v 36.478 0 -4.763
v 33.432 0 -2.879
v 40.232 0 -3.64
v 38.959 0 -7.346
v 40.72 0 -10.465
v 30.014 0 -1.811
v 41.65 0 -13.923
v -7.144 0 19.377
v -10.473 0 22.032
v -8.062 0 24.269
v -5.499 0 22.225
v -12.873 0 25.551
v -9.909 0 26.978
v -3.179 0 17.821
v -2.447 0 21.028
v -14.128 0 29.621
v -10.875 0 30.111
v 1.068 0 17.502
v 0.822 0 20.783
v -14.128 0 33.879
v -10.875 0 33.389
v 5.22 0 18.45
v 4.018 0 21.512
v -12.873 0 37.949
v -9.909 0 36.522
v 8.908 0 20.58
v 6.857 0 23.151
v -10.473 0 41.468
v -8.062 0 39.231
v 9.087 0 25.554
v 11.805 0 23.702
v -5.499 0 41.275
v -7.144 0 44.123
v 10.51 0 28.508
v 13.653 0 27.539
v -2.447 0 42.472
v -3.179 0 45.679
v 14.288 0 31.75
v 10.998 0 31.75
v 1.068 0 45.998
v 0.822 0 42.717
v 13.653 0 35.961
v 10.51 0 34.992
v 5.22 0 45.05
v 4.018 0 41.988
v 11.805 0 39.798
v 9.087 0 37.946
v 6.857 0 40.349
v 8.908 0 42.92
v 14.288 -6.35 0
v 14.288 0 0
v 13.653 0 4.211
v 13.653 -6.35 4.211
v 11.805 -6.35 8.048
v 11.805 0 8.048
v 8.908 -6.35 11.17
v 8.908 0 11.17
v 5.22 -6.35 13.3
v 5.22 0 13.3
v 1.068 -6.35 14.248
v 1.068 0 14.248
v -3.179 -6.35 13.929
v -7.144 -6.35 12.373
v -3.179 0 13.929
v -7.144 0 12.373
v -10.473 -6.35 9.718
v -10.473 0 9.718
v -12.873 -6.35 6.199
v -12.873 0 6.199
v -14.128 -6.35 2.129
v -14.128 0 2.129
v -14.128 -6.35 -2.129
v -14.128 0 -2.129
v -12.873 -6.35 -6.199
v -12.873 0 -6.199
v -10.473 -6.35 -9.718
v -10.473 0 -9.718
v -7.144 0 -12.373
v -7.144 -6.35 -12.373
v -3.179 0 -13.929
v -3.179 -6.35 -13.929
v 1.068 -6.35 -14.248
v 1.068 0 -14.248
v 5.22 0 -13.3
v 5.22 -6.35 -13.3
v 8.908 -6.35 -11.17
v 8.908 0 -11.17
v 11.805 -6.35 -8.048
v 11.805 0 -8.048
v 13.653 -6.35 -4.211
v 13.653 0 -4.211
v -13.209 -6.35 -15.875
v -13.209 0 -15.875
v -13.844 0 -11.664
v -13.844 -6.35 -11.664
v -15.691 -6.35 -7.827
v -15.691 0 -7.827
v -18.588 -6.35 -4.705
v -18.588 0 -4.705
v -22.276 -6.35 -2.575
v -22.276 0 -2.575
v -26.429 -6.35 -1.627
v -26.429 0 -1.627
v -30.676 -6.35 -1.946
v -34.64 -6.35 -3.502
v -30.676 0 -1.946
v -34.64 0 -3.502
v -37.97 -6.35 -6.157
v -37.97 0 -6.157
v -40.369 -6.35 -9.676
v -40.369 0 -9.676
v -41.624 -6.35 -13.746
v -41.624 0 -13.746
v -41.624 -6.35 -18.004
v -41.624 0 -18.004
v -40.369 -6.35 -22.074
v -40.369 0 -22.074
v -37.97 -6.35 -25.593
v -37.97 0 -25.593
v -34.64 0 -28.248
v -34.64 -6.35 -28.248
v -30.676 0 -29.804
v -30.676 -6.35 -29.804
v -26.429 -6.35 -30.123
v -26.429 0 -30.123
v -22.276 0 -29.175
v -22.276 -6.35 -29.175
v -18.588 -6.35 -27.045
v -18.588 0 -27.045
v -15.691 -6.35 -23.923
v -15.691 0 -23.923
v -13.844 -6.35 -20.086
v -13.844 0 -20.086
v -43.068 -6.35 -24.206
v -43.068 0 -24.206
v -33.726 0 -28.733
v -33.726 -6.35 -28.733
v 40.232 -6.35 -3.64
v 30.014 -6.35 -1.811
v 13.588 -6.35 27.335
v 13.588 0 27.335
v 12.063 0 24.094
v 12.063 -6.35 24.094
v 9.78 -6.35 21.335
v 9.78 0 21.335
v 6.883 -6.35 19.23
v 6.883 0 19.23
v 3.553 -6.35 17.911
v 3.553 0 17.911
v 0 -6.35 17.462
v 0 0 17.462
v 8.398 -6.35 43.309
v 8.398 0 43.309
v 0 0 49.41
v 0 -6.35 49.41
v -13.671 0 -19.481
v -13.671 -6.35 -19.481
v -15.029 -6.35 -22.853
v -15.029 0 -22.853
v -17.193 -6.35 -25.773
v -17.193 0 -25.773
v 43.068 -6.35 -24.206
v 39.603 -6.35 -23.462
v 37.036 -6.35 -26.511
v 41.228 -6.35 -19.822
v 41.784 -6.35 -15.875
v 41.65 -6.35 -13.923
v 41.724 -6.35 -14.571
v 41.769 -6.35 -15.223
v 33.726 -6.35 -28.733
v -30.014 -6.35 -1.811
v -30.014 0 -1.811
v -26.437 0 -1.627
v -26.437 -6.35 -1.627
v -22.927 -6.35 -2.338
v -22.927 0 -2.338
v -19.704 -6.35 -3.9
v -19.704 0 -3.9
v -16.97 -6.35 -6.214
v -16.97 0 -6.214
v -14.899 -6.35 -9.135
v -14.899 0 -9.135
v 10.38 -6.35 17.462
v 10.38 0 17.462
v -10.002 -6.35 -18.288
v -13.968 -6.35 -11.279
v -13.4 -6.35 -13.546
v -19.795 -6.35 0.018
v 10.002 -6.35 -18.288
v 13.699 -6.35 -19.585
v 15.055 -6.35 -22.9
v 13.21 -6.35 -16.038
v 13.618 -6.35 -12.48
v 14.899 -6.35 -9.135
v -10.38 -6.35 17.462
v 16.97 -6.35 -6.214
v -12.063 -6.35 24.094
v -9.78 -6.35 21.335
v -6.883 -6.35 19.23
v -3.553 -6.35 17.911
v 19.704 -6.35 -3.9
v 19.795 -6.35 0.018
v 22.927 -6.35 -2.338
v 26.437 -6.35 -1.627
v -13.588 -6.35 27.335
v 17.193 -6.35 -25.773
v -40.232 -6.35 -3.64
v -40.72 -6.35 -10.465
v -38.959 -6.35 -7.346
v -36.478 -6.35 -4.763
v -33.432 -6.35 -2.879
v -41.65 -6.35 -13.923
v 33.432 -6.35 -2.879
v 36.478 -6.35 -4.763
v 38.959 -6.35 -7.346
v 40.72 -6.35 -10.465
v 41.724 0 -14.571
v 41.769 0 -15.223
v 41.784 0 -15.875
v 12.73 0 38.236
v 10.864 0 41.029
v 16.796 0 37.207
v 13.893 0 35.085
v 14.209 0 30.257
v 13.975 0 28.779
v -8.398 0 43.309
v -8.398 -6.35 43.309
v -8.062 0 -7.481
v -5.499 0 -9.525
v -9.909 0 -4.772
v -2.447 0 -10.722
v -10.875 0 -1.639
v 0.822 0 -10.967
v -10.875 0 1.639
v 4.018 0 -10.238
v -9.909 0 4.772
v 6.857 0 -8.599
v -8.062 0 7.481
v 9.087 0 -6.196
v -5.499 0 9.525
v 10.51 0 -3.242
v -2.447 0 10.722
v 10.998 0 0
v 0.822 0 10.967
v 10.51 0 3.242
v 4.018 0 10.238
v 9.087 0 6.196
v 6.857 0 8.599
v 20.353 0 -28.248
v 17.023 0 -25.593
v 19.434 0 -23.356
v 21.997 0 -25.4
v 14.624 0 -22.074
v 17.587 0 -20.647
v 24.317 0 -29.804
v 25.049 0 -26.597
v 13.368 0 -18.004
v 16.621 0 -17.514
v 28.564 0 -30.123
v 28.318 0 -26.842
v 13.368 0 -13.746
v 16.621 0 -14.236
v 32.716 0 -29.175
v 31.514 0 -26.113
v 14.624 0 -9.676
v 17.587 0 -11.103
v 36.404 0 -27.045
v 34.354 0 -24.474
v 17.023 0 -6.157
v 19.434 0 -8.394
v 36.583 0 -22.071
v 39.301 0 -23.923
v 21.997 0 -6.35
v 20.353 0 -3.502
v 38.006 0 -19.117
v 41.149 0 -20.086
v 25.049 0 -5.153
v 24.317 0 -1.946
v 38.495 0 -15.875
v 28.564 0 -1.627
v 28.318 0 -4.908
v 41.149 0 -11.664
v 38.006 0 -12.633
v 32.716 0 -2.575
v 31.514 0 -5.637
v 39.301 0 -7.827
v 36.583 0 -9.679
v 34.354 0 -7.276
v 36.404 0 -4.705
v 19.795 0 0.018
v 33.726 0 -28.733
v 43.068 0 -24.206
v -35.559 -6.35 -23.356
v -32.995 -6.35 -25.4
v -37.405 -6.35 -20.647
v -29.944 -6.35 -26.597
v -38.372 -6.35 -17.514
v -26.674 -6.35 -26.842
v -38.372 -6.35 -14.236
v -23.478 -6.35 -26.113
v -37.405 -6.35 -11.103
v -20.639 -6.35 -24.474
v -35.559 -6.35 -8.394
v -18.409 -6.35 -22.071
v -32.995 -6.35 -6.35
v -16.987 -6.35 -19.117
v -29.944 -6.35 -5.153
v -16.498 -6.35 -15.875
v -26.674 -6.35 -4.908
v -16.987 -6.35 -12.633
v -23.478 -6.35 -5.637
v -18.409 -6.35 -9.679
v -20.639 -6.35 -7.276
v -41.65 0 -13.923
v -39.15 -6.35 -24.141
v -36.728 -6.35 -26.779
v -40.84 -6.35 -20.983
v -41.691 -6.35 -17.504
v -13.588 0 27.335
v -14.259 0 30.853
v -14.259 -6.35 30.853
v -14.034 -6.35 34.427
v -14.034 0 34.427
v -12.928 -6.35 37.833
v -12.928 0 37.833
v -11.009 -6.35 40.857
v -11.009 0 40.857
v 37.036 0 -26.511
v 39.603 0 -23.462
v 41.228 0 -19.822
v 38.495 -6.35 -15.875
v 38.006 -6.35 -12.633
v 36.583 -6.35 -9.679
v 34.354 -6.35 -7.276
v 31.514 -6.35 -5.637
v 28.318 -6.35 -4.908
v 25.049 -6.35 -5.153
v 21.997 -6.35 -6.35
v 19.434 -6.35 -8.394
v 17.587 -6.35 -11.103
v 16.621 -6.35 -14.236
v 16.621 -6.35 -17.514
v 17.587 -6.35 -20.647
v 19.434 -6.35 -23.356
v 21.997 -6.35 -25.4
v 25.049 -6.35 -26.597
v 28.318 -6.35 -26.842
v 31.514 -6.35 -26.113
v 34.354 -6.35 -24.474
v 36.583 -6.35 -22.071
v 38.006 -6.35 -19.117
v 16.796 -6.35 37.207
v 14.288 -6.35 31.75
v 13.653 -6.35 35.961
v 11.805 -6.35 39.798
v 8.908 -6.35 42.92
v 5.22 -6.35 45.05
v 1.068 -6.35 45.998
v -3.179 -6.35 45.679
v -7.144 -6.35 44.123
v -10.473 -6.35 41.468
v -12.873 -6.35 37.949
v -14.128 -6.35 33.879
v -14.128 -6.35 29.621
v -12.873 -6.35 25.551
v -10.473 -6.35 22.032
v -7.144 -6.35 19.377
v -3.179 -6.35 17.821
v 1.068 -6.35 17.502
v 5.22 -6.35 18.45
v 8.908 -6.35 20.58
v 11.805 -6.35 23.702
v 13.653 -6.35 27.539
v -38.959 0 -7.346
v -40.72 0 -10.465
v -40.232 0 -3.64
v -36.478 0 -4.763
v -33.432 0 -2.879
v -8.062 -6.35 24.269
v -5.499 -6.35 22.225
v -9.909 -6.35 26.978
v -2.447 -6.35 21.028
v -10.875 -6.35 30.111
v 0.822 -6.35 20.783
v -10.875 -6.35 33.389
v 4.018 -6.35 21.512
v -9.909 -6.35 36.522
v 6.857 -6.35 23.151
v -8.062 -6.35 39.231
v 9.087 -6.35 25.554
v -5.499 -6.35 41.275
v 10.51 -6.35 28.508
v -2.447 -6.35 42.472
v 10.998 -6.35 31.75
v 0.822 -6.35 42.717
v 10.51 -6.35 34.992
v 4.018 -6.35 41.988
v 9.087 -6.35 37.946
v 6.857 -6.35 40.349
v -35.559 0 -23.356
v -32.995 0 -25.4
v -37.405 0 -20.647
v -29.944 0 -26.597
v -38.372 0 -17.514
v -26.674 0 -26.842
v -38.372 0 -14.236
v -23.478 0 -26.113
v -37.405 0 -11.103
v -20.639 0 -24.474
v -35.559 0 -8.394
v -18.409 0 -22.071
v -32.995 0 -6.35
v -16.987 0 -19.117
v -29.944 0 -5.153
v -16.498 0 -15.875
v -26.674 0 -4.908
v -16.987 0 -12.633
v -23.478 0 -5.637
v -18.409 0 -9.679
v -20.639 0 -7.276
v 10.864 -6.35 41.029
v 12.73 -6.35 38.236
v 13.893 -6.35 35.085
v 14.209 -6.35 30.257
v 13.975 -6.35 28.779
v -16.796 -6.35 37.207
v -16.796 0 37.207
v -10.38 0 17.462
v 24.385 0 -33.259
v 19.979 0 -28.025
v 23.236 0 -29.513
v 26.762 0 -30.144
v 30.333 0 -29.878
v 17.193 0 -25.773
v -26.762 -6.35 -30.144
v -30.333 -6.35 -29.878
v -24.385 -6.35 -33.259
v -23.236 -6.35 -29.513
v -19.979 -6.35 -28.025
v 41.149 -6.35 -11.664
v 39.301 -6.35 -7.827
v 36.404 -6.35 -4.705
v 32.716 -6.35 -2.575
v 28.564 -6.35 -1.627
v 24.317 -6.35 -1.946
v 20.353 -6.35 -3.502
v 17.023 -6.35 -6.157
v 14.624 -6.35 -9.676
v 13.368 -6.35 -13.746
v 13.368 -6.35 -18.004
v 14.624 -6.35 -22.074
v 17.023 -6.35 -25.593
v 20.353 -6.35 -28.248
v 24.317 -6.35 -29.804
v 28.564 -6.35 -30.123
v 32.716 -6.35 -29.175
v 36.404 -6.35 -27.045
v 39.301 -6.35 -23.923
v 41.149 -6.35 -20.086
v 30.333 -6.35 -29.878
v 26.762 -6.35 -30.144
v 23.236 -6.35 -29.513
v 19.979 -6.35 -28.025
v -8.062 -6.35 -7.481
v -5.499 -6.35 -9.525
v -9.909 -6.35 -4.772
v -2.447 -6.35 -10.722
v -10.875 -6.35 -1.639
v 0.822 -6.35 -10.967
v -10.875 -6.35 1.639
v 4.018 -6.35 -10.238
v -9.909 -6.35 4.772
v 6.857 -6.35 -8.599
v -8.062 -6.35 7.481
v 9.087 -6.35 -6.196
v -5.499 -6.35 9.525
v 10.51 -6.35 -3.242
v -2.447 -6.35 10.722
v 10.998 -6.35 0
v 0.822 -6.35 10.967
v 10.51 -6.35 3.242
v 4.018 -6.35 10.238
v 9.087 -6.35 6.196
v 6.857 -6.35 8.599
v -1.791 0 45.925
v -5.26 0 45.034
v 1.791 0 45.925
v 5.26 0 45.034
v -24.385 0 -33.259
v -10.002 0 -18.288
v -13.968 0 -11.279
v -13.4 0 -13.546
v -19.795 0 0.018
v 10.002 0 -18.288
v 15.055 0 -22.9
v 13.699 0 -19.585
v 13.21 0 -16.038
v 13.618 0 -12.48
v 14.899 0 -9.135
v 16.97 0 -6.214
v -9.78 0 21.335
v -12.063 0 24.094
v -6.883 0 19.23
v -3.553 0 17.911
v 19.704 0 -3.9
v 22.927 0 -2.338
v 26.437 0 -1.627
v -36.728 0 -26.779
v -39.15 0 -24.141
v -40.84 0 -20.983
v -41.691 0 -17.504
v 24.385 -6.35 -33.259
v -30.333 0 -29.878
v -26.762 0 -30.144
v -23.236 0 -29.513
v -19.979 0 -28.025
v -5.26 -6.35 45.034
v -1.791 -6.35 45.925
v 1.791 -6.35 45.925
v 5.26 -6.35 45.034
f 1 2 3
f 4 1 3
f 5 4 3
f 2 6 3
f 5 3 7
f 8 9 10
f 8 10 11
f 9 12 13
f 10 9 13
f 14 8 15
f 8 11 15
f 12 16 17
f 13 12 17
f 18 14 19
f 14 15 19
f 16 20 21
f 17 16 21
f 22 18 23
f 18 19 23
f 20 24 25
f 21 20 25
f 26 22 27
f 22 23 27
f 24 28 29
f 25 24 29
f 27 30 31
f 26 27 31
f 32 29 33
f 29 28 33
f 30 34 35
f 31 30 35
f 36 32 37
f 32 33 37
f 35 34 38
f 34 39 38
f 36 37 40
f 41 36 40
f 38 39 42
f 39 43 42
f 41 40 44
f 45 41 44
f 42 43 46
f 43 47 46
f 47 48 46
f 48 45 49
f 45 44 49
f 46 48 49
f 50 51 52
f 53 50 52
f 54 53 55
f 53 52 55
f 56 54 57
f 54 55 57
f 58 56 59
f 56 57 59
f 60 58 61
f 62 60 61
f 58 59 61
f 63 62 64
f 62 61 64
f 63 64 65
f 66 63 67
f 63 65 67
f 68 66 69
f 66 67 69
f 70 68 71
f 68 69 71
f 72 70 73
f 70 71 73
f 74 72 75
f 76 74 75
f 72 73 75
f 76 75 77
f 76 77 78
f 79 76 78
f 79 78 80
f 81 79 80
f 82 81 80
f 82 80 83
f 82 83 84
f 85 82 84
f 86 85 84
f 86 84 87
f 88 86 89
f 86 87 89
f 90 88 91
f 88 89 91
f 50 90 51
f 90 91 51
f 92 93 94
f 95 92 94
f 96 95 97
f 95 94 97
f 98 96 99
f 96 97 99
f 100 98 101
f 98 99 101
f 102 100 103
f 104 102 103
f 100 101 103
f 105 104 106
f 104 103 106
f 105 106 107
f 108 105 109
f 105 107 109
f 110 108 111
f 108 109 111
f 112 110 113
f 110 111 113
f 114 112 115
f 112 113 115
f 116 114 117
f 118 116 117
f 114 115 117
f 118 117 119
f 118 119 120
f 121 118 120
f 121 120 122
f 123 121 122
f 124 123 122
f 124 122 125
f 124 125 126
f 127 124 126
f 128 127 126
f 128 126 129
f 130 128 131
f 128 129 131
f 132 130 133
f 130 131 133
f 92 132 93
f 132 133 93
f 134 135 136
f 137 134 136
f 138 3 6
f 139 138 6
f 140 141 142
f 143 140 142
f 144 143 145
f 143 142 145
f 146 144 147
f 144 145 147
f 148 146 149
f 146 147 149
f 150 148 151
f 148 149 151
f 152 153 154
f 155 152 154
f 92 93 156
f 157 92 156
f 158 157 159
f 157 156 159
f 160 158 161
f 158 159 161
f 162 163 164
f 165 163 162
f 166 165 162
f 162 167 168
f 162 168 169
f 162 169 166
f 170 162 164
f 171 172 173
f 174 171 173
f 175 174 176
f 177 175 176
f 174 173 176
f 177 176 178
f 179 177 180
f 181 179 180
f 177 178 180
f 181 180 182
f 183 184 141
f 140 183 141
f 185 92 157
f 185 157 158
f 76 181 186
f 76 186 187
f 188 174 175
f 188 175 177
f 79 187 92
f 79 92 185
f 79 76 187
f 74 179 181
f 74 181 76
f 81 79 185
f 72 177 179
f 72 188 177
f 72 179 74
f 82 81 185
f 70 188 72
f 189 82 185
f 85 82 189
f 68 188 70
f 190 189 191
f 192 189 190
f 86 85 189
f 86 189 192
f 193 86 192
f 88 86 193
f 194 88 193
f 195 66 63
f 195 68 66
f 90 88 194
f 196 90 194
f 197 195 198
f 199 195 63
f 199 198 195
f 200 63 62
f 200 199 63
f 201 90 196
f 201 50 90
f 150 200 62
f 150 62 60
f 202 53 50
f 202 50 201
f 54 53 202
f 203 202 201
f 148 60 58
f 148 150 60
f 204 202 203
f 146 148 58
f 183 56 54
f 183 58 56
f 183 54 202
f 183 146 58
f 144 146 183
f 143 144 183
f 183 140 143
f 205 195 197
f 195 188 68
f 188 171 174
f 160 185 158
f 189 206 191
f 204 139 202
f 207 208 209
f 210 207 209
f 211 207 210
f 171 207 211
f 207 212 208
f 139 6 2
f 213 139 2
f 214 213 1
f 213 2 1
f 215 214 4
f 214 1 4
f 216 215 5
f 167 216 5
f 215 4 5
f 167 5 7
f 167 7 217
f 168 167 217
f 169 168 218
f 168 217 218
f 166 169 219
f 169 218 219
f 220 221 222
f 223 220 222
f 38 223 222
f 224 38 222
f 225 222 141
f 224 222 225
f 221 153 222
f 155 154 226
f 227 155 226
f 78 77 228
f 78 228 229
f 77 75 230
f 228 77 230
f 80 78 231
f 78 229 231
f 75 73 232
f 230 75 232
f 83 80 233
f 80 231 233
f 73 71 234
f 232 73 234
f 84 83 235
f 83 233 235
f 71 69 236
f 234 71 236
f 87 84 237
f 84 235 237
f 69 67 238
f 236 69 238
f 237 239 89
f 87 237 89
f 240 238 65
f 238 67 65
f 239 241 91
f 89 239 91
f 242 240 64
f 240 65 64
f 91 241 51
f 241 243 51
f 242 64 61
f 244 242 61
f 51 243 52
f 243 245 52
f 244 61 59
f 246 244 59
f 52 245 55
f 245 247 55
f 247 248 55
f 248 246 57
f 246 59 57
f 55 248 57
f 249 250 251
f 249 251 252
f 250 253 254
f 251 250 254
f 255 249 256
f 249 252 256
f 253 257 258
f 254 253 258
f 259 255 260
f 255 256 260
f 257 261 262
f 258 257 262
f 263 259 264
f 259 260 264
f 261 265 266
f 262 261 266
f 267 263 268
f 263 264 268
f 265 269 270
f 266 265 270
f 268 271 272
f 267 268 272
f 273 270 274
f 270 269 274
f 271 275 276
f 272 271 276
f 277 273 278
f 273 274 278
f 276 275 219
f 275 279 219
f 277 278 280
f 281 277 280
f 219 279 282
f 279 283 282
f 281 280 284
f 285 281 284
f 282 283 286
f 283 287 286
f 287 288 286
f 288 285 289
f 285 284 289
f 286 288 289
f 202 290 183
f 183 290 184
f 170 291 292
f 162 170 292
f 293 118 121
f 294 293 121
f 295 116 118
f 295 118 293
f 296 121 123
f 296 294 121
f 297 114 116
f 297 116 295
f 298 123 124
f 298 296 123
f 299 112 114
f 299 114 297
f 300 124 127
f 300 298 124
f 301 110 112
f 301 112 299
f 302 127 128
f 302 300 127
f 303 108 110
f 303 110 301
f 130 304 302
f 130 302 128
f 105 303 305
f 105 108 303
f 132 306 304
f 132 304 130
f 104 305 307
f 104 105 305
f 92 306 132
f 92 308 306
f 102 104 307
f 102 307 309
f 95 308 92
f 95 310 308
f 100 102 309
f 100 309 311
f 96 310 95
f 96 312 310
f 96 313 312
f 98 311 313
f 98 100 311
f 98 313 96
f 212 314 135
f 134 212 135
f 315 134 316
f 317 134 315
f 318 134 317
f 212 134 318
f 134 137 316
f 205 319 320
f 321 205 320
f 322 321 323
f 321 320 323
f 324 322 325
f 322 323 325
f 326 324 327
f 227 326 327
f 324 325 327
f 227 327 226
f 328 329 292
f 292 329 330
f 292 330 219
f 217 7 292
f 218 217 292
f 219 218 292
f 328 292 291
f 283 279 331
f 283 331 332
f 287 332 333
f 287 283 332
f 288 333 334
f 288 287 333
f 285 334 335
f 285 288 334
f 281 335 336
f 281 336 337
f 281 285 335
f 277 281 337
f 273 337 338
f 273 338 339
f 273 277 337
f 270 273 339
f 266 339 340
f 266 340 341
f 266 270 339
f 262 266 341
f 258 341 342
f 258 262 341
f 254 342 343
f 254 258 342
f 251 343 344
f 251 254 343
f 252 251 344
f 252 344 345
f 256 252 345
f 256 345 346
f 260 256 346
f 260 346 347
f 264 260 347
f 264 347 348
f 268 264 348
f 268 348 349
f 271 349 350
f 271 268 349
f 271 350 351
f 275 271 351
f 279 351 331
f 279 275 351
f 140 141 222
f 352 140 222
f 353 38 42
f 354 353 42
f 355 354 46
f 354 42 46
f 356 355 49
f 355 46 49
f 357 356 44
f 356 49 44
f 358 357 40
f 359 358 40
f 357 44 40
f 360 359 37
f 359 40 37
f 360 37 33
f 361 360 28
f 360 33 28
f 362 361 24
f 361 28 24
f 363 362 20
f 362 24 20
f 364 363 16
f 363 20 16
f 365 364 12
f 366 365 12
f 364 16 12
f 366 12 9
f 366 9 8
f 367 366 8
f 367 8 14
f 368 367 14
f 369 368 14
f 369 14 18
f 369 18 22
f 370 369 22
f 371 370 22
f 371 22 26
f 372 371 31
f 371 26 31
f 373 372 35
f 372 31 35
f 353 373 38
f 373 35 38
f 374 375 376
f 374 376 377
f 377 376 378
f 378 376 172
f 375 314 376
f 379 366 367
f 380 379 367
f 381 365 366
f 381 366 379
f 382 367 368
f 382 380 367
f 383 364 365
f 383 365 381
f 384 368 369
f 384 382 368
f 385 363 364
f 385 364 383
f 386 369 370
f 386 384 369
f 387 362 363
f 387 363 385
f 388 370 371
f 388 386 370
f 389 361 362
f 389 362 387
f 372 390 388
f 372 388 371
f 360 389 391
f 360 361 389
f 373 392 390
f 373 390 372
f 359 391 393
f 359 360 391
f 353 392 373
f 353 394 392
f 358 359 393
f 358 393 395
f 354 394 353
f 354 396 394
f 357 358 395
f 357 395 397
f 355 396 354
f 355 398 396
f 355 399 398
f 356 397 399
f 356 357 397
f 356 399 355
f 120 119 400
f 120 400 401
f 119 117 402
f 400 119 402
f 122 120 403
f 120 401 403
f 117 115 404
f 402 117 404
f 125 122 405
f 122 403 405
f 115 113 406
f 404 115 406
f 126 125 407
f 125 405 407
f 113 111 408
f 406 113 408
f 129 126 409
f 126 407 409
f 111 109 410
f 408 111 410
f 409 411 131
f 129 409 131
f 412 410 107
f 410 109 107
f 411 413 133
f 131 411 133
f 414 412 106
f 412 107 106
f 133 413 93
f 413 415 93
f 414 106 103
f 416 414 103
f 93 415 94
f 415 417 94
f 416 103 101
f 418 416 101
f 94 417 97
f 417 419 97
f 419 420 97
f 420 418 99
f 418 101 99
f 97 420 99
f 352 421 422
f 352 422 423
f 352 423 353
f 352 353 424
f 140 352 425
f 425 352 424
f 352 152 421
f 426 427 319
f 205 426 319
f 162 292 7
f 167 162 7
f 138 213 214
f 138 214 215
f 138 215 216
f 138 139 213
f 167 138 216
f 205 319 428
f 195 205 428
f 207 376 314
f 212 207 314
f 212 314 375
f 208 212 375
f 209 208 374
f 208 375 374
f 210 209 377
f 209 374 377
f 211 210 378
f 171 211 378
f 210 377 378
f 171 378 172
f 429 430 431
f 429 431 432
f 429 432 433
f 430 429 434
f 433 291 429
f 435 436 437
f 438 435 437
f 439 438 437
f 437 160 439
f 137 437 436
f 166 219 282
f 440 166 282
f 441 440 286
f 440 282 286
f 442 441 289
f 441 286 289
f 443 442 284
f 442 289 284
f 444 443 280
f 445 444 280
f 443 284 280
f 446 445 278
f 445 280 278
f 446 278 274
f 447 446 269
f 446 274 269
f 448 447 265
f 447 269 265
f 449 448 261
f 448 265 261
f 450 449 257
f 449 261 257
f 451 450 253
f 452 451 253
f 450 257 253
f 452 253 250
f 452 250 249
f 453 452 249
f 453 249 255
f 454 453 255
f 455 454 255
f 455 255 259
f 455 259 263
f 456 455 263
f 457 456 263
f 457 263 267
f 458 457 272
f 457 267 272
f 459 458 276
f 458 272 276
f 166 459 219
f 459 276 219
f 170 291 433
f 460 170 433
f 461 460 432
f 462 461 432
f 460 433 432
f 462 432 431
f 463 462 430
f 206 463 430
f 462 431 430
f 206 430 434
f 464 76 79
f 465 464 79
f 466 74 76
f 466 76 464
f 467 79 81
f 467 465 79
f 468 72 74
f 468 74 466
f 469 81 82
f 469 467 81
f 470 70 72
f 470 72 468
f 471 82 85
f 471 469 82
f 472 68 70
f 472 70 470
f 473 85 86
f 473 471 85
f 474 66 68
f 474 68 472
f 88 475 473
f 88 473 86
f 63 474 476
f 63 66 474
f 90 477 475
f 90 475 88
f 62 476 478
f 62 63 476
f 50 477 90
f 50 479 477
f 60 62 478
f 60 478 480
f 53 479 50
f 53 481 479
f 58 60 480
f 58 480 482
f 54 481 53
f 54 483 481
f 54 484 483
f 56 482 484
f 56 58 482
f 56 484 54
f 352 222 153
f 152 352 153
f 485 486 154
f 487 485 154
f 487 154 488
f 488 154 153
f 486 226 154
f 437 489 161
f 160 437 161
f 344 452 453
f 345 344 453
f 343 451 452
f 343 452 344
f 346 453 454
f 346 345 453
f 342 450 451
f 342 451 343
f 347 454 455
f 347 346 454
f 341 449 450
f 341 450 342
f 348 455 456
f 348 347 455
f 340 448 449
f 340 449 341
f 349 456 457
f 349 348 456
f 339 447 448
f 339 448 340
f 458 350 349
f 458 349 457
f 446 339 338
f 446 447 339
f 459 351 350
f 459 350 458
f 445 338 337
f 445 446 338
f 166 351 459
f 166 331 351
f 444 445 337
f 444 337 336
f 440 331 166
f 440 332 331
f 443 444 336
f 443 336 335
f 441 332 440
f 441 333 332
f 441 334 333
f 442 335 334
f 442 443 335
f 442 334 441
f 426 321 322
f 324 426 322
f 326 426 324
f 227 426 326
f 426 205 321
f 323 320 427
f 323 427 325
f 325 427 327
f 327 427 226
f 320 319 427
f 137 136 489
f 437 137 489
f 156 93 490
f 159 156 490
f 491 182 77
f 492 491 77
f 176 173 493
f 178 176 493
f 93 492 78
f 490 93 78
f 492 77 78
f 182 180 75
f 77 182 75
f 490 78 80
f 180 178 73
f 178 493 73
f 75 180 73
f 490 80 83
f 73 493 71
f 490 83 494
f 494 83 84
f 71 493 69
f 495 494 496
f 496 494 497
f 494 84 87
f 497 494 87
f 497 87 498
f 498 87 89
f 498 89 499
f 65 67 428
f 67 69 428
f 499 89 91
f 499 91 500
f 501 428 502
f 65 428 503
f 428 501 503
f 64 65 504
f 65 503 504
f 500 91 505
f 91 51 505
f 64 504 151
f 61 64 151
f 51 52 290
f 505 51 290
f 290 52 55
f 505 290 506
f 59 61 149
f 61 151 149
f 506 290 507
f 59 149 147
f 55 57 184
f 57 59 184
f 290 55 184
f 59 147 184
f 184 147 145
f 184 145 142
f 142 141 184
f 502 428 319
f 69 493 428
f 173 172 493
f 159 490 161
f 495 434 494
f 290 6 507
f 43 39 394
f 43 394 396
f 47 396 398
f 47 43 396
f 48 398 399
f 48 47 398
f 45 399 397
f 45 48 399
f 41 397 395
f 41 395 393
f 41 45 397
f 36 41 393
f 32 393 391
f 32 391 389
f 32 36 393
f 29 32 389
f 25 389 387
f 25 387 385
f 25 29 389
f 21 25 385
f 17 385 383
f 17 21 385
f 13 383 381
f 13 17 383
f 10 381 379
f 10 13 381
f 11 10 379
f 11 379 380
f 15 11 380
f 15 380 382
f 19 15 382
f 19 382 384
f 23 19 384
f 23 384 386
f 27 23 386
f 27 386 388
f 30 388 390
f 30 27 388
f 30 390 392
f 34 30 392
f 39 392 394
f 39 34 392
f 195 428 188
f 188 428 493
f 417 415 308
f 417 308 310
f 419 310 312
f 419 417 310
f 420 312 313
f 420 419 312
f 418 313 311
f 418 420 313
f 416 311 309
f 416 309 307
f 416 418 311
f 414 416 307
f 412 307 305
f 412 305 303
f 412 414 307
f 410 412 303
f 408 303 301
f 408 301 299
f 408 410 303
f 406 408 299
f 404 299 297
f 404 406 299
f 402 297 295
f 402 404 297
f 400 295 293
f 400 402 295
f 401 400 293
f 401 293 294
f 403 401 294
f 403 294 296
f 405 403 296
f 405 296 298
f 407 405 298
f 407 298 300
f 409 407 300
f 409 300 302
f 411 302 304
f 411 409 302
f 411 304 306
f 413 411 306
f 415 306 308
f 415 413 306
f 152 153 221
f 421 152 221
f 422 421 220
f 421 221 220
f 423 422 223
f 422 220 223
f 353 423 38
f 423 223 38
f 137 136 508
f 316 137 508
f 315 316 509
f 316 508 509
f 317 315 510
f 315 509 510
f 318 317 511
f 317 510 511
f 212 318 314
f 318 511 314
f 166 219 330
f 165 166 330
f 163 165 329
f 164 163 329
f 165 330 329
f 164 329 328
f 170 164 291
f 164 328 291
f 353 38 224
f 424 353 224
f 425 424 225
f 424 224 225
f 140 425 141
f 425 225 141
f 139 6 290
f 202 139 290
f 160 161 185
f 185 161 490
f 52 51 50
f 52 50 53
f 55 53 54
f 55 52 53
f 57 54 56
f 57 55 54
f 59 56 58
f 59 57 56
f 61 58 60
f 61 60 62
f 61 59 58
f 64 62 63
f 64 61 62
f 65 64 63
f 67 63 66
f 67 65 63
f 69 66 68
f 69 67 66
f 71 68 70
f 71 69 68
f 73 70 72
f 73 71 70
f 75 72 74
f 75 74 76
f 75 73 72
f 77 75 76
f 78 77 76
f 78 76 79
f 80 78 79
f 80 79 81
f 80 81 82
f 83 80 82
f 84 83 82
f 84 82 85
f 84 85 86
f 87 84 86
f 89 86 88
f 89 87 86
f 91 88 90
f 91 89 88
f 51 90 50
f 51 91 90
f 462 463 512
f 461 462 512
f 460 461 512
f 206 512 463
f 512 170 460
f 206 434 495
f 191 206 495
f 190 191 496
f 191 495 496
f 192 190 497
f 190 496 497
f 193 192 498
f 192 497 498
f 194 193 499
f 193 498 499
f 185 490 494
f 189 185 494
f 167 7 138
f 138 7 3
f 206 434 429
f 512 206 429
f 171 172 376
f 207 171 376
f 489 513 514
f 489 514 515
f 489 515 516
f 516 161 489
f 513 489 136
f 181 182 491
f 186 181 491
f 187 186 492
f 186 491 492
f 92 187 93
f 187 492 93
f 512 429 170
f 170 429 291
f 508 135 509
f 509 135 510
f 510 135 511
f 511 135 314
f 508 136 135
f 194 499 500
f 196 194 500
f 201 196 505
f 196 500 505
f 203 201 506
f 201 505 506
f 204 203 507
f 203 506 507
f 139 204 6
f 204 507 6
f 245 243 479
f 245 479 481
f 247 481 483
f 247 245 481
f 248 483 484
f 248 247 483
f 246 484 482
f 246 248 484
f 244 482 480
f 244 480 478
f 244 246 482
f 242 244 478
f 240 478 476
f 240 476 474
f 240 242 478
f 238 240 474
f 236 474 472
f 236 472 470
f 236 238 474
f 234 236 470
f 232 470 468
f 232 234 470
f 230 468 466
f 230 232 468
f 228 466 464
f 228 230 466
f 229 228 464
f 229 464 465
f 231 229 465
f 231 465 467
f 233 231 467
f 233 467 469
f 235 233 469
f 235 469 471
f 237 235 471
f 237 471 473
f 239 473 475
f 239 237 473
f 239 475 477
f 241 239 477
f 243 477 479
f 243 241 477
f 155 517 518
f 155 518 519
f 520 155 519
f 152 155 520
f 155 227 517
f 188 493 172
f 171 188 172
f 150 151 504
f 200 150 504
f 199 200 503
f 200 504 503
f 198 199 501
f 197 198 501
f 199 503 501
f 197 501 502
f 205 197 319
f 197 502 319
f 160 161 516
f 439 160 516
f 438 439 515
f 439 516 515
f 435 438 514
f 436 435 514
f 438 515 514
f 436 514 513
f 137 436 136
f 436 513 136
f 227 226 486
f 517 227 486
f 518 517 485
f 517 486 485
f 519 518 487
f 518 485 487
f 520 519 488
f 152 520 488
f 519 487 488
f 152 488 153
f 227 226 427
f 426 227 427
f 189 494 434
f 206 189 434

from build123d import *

# Parameters (mm, degrees)
F2_DEPTH = 6.35
F1_R     = 14.2875
F0_R     = 14.2875
F0_R_2   = 10.9982


with BuildPart() as f2:
    # F1 (on Front) → F2 (new body)
    with BuildSketch(Plane.XZ):
        with BuildLine():
            ThreePointArc((-8.3979814229, 43.3088305754), (1.363e-07, 46.0375), (8.3979816434, 43.3088304152))
            Line((8.3979816434, 43.3088304152), (0, 49.4103212285))
            Line((0, 49.4103212285), (-8.3979814229, 43.3088305754))
        make_face()
    extrude(amount=F2_DEPTH)


with BuildPart() as f2b:
    # F1 (on Front) → F2, piece 2 (new body)
    with BuildSketch(Plane.XZ):
        with BuildLine():
            ThreePointArc((8.3979816434, 43.3088304152), (12.7302556726, 38.2363893469), (14.2875, 31.75))
            ThreePointArc((14.2875, 31.75), (14.1115971627, 29.5149425581), (13.5882199624, 27.3349196492))
            Line((13.5882199624, 27.3349196492), (16.7959635843, 37.2073393857))
            Line((16.7959635843, 37.2073393857), (8.3979816434, 43.3088304152))
        make_face()
    extrude(amount=F2_DEPTH)


with BuildPart() as f2c:
    # F1 (on Front) → F2, piece 3 (new body)
    with BuildSketch(Plane.XZ):
        with BuildLine():
            Line((10.3804763689, 17.4625), (13.5882199624, 27.3349196492))
            ThreePointArc((13.5882199624, 27.3349196492), (8.3979817736, 20.1911696794), (0, 17.4625))
            Line((0, 17.4625), (10.3804763689, 17.4625))
        make_face()
        with BuildLine():
            Line((-10.3804763689, 17.4625), (0, 17.4625))
            ThreePointArc((0, 17.4625), (-8.3979818829, 20.1911697588), (-13.5882200459, 27.3349199063))
            Line((-13.5882200459, 27.3349199063), (-10.3804763689, 17.4625))
        make_face()
        Polygon((10.3804763689, 17.4625), (0, 17.4625), (-10.3804763689, 17.4625), (-19.7954741612, 0.01789546), (-14.8985256383, -9.1349279051), (-10.0015766949, -18.2877520565), (10.0015766949, -18.2877520565), (14.8985257481, -9.1349277), (19.7954741612, 0.01789546), align=None)
        Circle(F1_R, mode=Mode.SUBTRACT)
        with BuildLine():
            Line((30.013567735, -1.8110015473), (19.7954741612, 0.01789546))
            Line((19.7954741612, 0.01789546), (14.8985257481, -9.1349277))
            ThreePointArc((14.8985257481, -9.1349277), (21.266202822, -3.0173772206), (30.013567735, -1.8110015473))
        make_face()
        with BuildLine():
            ThreePointArc((17.1931887816, -25.7734049263), (13.3427727218, -17.8269569294), (14.8985257481, -9.1349277))
            Line((14.8985257481, -9.1349277), (10.0015766949, -18.2877520565))
            Line((10.0015766949, -18.2877520565), (17.1931887816, -25.7734049263))
        make_face()
        with BuildLine():
            Line((-14.8985256383, -9.1349279051), (-19.7954741612, 0.01789546))
            Line((-19.7954741612, 0.01789546), (-30.0135673402, -1.8110014766))
            ThreePointArc((-30.0135673402, -1.8110014766), (-21.2662025369, -3.0173773588), (-14.8985256383, -9.1349279051))
        make_face()
        with BuildLine():
            Line((-10.0015766949, -18.2877520565), (-14.8985256383, -9.1349279051))
            ThreePointArc((-14.8985256383, -9.1349279051), (-13.6376729558, -12.4006755198), (-13.2088065702, -15.875))
            ThreePointArc((-13.2088065702, -15.875), (-14.242279946, -21.2101133535), (-17.1931893516, -25.7734055196))
            Line((-17.1931893516, -25.7734055196), (-10.0015766949, -18.2877520565))
        make_face()
    extrude(amount=F2_DEPTH)


with BuildPart() as f2d:
    # F1 (on Front) → F2, piece 4 (new body)
    with BuildSketch(Plane.XZ):
        with BuildLine():
            ThreePointArc((-13.5882200459, 27.3349199063), (-13.5882198714, 36.1650806309), (-8.3979814229, 43.3088305754))
            Line((-8.3979814229, 43.3088305754), (-16.7959635843, 37.2073393857))
            Line((-16.7959635843, 37.2073393857), (-13.5882200459, 27.3349199063))
        make_face()
    extrude(amount=F2_DEPTH)


with BuildPart() as f2e:
    # F1 (on Front) → F2, piece 5 (new body)
    with BuildSketch(Plane.XZ):
        with BuildLine():
            Line((43.0680204275, -24.2061867966), (41.649840386, -13.9230428349))
            ThreePointArc((41.649840386, -13.9230428349), (41.7502756778, -14.8967255354), (41.7838065702, -15.875))
            ThreePointArc((41.7838065702, -15.875), (39.603025178, -23.4618320662), (33.7264108326, -28.7326225302))
            Line((33.7264108326, -28.7326225302), (43.0680204275, -24.2061867966))
        make_face()
    extrude(amount=F2_DEPTH)


with BuildPart() as f2f:
    # F1 (on Front) → F2, piece 6 (new body)
    with BuildSketch(Plane.XZ):
        with BuildLine():
            ThreePointArc((33.7264108326, -28.7326225302), (24.9790457568, -29.9389985156), (17.1931887816, -25.7734049263))
            Line((17.1931887816, -25.7734049263), (24.3848012922, -33.2590582374))
            Line((24.3848012922, -33.2590582374), (33.7264108326, -28.7326225302))
        make_face()
    extrude(amount=F2_DEPTH)


with BuildPart() as f2g:
    # F1 (on Front) → F2, piece 7 (new body)
    with BuildSketch(Plane.XZ):
        with BuildLine():
            Line((40.231660275, -3.6398983696), (30.013567735, -1.8110015473))
            ThreePointArc((30.013567735, -1.8110015473), (37.7994244167, -5.9765951341), (41.649840386, -13.9230428349))
            Line((41.649840386, -13.9230428349), (40.231660275, -3.6398983696))
        make_face()
    extrude(amount=F2_DEPTH)


with BuildPart() as f2h:
    # F1 (on Front) → F2, piece 8 (new body)
    with BuildSketch(Plane.XZ):
        with BuildLine():
            Line((-24.3848012922, -33.2590582374), (-17.1931893516, -25.7734055196))
            ThreePointArc((-17.1931893516, -25.7734055196), (-24.9790461617, -29.9389985881), (-33.7264108326, -28.7326225302))
            Line((-33.7264108326, -28.7326225302), (-24.3848012922, -33.2590582374))
        make_face()
    extrude(amount=F2_DEPTH)


with BuildPart() as f2i:
    # F1 (on Front) → F2, piece 9 (new body)
    with BuildSketch(Plane.XZ):
        with BuildLine():
            ThreePointArc((-33.7264108326, -28.7326225302), (-40.0940877018, -22.6150717213), (-41.6498403532, -13.923042597))
            Line((-41.6498403532, -13.923042597), (-43.0680204275, -24.2061867966))
            Line((-43.0680204275, -24.2061867966), (-33.7264108326, -28.7326225302))
        make_face()
    extrude(amount=F2_DEPTH)


with BuildPart() as f2j:
    # F1 (on Front) → F2, piece 10 (new body)
    with BuildSketch(Plane.XZ):
        with BuildLine():
            ThreePointArc((-41.6498403532, -13.923042597), (-37.7994241946, -5.9765949029), (-30.0135673402, -1.8110014766))
            Line((-30.0135673402, -1.8110014766), (-40.231660275, -3.6398983696))
            Line((-40.231660275, -3.6398983696), (-41.6498403532, -13.923042597))
        make_face()
    extrude(amount=F2_DEPTH)


with BuildPart() as f2k:
    # F0 (on Front) → F2, piece 11 (new body)
    with BuildSketch(Plane.XZ):
        with Locations((0, 31.75)):
            Circle(F0_R)
        with Locations((0, 31.75)):
            Circle(F0_R_2, mode=Mode.SUBTRACT)
    extrude(amount=F2_DEPTH)


with BuildPart() as f2l:
    # F0 (on Front) → F2, piece 12 (new body)
    with BuildSketch(Plane.XZ):
        Circle(F0_R)
        Circle(F0_R_2, mode=Mode.SUBTRACT)
    extrude(amount=F2_DEPTH)


with BuildPart() as f2m:
    # F0 (on Front) → F2, piece 13 (new body)
    with BuildSketch(Plane.XZ):
        with Locations((27.4963065702, -15.875)):
            Circle(F0_R)
        with Locations((27.4963065702, -15.875)):
            Circle(F0_R_2, mode=Mode.SUBTRACT)
    extrude(amount=F2_DEPTH)


with BuildPart() as f2n:
    # F0 (on Front) → F2, piece 14 (new body)
    with BuildSketch(Plane.XZ):
        with Locations((-27.4963065702, -15.875)):
            Circle(F0_R)
        with Locations((-27.4963065702, -15.875)):
            Circle(F0_R_2, mode=Mode.SUBTRACT)
    extrude(amount=F2_DEPTH)


solid = Compound([f2.part, f2b.part, f2c.part, f2d.part, f2e.part, f2f.part, f2g.part, f2h.part, f2i.part, f2j.part, f2k.part, f2l.part, f2m.part, f2n.part])
